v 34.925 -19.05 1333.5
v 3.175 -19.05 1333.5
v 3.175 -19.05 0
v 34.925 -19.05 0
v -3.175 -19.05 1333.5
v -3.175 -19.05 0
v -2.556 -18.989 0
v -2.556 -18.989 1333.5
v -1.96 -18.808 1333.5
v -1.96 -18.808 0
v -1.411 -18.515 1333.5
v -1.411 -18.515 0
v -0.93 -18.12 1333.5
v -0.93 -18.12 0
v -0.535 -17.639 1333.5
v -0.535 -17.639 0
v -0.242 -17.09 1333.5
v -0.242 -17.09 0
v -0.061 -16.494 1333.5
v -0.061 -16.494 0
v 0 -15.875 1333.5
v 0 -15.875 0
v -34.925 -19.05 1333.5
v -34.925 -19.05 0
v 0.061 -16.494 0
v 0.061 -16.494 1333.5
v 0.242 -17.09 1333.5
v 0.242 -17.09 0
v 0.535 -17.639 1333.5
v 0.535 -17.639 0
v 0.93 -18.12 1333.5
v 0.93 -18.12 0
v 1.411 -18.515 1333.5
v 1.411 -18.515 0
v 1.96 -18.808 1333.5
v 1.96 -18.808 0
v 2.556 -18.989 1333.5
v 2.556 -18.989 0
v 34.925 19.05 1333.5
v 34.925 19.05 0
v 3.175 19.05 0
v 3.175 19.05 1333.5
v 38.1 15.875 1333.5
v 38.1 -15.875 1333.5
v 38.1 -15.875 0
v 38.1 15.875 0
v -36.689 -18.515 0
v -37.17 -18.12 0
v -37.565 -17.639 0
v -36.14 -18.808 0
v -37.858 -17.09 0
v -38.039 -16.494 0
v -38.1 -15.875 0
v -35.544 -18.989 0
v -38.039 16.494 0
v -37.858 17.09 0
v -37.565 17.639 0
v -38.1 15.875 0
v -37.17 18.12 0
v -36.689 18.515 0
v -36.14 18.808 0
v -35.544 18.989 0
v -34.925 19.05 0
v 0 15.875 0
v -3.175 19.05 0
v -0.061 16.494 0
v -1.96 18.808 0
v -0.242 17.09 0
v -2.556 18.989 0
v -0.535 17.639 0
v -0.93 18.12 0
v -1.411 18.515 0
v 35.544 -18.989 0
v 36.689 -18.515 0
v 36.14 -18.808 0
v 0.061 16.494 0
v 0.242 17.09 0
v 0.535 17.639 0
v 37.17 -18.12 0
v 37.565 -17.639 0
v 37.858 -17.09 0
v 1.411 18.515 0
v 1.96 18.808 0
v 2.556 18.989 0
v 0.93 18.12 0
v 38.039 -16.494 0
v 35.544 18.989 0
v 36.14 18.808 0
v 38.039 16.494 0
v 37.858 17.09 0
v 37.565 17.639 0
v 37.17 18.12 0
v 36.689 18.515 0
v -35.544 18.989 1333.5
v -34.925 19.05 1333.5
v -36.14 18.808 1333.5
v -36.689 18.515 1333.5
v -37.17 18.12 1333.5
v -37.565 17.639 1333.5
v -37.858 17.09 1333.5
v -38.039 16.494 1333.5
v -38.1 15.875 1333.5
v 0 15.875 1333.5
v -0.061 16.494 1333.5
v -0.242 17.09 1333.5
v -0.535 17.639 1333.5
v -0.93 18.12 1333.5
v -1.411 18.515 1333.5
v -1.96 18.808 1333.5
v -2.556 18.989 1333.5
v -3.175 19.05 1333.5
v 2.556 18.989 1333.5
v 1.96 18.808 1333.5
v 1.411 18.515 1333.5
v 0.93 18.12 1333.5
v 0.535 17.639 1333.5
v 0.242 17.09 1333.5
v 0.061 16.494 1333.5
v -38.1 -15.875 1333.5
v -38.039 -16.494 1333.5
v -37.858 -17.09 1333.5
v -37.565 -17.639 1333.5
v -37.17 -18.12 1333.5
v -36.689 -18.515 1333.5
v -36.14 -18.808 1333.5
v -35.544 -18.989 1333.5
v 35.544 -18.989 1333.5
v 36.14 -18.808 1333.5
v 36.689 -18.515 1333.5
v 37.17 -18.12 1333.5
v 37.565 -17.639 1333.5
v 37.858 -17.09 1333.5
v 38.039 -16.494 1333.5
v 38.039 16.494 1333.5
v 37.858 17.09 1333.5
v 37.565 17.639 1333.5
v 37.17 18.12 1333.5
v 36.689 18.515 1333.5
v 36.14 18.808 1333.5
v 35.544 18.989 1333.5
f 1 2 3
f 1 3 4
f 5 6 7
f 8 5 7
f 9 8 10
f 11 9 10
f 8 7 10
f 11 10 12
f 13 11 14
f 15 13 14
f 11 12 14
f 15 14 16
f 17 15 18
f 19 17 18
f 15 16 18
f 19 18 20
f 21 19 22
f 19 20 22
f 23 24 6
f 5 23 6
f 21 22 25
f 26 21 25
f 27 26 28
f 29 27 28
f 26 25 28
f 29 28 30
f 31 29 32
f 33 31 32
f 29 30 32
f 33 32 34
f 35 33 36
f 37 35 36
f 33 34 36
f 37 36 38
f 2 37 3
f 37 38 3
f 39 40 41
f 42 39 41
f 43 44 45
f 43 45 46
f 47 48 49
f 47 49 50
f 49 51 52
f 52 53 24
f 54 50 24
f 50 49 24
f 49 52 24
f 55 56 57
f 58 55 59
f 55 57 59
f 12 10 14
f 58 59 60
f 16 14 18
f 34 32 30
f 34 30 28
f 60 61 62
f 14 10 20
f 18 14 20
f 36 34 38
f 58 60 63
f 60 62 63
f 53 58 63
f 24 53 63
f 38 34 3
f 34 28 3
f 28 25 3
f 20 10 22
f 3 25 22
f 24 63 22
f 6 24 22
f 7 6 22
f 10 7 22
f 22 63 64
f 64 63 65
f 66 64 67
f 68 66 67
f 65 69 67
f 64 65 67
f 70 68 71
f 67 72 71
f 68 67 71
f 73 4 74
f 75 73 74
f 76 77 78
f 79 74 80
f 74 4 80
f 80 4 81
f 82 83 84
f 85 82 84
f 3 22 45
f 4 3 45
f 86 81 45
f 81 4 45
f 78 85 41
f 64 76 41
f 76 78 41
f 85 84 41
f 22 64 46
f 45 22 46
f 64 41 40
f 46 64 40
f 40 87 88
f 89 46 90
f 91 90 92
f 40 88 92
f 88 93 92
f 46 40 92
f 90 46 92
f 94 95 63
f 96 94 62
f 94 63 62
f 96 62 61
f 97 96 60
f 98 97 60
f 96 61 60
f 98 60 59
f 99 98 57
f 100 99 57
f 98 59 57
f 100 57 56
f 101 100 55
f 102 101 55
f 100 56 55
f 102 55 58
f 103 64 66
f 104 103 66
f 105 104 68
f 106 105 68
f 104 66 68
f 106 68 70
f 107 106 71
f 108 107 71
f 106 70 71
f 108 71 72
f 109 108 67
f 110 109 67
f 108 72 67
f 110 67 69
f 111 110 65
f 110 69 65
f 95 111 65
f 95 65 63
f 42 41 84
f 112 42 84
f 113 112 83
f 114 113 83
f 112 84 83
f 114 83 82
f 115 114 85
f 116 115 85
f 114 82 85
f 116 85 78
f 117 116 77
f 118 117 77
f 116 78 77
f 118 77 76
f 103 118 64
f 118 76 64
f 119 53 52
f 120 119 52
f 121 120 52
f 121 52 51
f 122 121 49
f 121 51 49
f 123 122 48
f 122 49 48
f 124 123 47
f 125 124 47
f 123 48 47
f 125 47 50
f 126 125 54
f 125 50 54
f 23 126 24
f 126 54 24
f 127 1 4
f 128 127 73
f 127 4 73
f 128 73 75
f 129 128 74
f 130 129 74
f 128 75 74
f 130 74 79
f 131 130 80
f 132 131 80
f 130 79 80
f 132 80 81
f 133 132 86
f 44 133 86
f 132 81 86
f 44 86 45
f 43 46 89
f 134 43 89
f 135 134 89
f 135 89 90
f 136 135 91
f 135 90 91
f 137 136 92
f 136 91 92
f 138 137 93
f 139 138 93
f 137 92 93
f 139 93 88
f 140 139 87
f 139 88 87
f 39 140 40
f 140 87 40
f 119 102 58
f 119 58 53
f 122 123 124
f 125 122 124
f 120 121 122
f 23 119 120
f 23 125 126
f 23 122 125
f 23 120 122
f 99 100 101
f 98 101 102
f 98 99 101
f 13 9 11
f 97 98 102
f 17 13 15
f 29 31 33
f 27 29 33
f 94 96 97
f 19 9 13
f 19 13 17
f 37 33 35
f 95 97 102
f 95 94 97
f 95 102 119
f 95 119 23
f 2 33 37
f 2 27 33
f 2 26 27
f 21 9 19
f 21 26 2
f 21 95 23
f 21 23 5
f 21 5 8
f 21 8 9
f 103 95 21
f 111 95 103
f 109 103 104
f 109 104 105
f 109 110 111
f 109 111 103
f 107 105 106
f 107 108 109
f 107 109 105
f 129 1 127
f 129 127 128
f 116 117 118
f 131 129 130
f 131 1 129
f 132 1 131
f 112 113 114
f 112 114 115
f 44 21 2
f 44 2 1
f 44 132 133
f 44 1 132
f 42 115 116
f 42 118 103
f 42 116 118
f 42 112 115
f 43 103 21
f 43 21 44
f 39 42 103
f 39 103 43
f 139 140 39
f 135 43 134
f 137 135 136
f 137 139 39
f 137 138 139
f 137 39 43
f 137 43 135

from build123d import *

# Parameters (mm, degrees)
F1_DEPTH = 1333.5


with BuildPart() as f1:
    # F0 (on Top) → F1 (new body)
    with BuildSketch(Plane.XY):
        with BuildLine():
            ThreePointArc((38.1, 15.875), (37.170064, 18.120064), (34.925, 19.05))
            Line((34.925, 19.05), (3.175, 19.05))
            ThreePointArc((3.175, 19.05), (0.929936, 18.120064), (0, 15.875))
            Line((0, 15.875), (0, -15.875))
            ThreePointArc((0, -15.875), (0.929936, -18.120064), (3.175, -19.05))
            Line((3.175, -19.05), (34.925, -19.05))
            ThreePointArc((34.925, -19.05), (37.170064, -18.120064), (38.1, -15.875))
            Line((38.1, -15.875), (38.1, 15.875))
        make_face()
        with BuildLine():
            Line((0, -15.875), (0, 15.875))
            ThreePointArc((0, 15.875), (-0.929936, 18.120064), (-3.175, 19.05))
            Line((-3.175, 19.05), (-34.925, 19.05))
            ThreePointArc((-34.925, 19.05), (-37.170064, 18.120064), (-38.1, 15.875))
            Line((-38.1, 15.875), (-38.1, -15.875))
            ThreePointArc((-38.1, -15.875), (-37.170064, -18.120064), (-34.925, -19.05))
            Line((-34.925, -19.05), (-3.175, -19.05))
            ThreePointArc((-3.175, -19.05), (-0.929936, -18.120064), (0, -15.875))
        make_face()
    extrude(amount=F1_DEPTH)


solid = f1.part
